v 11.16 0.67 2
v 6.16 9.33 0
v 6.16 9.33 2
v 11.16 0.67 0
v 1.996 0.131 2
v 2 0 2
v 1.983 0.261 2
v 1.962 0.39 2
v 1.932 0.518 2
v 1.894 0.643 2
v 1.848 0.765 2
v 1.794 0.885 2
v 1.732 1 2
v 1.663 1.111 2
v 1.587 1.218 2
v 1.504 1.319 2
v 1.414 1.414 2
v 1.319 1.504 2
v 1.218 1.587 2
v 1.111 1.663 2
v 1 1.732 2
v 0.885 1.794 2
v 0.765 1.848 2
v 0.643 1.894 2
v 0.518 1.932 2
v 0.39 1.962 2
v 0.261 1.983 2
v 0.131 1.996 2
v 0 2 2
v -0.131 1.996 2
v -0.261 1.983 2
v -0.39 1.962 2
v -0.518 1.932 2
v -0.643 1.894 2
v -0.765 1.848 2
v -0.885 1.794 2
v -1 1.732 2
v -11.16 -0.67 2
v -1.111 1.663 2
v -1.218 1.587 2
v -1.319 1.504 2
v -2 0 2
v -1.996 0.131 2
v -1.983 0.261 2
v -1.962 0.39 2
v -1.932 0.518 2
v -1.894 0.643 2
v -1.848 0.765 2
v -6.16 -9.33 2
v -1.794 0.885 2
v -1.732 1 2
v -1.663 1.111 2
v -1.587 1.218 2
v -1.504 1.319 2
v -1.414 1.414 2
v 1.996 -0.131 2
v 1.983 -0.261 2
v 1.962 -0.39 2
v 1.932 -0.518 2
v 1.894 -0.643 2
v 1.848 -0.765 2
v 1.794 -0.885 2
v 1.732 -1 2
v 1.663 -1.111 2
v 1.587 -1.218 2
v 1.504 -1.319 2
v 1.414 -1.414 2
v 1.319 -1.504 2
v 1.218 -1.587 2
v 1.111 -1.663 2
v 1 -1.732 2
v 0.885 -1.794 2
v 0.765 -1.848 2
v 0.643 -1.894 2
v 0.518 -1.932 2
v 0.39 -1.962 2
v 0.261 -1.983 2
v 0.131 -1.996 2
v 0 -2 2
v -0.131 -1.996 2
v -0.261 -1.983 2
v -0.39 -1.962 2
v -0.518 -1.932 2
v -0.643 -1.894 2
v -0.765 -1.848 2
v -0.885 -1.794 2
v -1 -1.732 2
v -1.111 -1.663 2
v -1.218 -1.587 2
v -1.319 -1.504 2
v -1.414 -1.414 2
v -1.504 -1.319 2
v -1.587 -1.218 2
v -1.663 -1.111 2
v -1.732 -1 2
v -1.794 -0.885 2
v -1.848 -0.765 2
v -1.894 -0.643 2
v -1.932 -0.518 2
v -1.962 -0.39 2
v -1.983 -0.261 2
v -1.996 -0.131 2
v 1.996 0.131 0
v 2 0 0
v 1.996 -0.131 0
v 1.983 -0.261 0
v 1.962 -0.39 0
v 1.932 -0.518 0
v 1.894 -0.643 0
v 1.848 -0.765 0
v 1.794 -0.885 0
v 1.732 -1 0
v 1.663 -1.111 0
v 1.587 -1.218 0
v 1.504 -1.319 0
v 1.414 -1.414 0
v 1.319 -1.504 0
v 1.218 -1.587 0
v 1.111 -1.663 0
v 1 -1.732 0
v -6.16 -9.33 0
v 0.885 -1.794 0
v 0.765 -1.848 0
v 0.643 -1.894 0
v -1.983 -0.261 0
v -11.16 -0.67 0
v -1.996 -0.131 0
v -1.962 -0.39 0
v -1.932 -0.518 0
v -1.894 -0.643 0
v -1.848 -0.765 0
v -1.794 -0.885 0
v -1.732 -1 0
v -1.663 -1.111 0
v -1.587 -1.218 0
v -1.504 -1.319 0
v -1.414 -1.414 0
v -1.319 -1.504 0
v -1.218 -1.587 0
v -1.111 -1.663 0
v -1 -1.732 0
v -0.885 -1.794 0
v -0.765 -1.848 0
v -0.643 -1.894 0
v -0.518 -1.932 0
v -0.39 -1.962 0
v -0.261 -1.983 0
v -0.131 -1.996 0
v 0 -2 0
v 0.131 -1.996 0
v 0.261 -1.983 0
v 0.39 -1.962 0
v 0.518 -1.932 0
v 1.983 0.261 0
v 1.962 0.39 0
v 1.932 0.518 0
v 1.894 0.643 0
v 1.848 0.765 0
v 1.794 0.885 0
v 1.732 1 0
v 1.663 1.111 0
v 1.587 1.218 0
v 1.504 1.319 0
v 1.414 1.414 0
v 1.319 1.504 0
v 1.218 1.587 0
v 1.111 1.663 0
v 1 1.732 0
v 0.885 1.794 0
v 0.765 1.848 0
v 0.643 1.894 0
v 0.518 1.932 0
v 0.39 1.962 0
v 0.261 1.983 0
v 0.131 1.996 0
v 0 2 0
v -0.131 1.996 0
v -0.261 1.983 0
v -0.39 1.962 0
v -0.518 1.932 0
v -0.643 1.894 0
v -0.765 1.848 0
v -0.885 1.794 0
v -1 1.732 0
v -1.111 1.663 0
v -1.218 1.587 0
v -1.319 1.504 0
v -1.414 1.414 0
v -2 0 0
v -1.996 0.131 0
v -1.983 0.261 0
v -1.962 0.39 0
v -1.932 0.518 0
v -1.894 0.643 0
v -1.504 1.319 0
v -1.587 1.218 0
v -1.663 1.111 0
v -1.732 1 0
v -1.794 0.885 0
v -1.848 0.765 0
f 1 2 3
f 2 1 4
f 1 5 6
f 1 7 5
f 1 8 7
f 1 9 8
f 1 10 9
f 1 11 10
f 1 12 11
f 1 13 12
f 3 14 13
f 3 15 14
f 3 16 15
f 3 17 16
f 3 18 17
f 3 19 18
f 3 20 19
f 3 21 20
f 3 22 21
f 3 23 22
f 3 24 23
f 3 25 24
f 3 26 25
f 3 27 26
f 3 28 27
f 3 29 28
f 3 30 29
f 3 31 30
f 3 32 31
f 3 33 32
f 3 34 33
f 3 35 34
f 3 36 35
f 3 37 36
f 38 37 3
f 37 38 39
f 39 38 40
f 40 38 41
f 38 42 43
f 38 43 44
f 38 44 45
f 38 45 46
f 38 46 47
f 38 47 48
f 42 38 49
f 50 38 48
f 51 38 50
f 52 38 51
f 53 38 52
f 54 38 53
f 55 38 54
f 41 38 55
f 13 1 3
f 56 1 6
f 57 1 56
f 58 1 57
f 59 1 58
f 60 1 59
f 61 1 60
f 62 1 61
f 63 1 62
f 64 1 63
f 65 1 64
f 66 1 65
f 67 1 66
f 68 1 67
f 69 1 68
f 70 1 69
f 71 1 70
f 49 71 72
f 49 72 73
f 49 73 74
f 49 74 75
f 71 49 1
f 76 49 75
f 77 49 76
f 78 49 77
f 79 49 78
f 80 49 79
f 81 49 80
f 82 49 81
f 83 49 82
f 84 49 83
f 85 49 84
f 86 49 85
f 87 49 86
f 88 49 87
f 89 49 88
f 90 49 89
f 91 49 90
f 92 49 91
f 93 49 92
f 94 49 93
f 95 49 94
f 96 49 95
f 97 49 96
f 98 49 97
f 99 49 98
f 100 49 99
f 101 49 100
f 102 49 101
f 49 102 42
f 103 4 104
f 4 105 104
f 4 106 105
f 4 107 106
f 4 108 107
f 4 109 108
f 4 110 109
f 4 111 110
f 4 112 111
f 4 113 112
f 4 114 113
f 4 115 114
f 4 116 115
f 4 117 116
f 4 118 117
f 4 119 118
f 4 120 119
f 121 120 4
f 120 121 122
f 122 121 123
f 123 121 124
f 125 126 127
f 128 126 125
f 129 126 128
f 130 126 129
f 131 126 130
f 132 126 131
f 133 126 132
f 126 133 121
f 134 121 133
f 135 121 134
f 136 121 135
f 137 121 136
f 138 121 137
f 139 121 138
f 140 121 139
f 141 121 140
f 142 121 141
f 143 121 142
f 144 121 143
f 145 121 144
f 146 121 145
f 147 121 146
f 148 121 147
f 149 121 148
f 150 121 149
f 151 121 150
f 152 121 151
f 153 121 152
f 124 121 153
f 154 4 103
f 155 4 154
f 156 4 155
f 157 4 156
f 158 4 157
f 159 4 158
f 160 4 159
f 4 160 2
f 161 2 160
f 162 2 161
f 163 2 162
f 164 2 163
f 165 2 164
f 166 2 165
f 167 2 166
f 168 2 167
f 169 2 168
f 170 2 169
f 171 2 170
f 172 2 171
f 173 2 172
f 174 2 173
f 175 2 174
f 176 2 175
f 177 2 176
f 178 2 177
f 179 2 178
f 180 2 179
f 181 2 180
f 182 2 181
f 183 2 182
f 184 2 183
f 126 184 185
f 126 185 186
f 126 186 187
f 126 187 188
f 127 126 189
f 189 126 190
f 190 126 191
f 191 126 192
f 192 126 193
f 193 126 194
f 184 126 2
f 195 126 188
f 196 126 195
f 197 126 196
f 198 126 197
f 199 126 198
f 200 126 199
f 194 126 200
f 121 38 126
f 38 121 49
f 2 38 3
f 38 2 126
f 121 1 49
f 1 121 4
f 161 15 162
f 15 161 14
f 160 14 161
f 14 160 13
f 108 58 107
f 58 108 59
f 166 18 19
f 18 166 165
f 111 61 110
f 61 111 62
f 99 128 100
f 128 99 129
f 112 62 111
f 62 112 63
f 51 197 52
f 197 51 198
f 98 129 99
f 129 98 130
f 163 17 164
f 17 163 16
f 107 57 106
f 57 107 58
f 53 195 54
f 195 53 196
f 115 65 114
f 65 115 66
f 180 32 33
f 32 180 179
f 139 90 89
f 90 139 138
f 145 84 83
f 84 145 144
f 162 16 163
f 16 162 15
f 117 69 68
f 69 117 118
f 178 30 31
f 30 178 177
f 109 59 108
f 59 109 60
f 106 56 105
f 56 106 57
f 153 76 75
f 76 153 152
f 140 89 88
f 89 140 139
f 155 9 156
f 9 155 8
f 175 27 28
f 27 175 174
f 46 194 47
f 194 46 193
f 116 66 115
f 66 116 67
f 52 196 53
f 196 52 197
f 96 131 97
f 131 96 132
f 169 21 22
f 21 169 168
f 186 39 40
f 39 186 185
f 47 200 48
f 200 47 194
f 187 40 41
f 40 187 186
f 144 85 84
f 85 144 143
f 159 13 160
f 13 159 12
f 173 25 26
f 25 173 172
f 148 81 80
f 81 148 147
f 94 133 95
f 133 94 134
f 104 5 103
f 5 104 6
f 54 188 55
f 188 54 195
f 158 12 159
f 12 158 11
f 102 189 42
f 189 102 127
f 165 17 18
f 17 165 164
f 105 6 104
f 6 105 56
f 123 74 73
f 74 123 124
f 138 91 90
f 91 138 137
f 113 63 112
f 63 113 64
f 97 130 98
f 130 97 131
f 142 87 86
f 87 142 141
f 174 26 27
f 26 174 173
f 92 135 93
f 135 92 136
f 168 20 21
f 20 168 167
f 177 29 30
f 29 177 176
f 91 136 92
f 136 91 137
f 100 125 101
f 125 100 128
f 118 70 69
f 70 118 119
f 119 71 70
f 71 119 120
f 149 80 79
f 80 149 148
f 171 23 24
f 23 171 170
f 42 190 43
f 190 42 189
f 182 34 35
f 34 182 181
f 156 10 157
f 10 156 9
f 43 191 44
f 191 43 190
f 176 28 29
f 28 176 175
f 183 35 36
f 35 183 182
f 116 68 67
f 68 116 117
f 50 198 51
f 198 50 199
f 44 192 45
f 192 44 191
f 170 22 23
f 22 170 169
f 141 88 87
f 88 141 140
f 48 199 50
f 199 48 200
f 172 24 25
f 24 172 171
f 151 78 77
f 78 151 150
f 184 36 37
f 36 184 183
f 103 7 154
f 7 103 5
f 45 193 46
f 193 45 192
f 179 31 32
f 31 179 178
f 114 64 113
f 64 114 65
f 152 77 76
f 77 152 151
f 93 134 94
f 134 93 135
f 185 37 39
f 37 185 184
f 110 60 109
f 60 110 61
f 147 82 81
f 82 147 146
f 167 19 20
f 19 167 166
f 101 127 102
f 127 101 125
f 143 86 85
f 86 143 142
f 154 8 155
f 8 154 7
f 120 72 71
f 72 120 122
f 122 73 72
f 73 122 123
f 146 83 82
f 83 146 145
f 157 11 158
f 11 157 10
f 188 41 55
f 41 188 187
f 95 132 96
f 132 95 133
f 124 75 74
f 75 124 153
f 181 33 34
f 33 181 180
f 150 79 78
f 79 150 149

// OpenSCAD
// Auto-generated from tests/data/feature_fixtures_manifest.json
// fixture: plate_rotated_z30_with_hole
// fixture_type: plate
// description: Plate rotated 30° around Z with a single through-hole. Validates rotated-plate local-frame cutout detection for Z-axis rotation.
// transform: rotate=[0.000000, 0.000000, 30.000000], translate=[0.000000, 0.000000, 0.000000]
$fn = 96;

plate_size = [20.000000, 10.000000, 2.000000];
plate_origin = [-10.000000, -5.000000, 0.000000];

module through_hole(center, diameter, height) {
  translate(center) cylinder(d=diameter, h=height, center=false);
}

module through_slot(start, end, width, height) {
  hull() {
    through_hole(start, width, height);
    through_hole(end, width, height);
  }
}

module counterbore_hole(center, through_d, bore_d, bore_depth, plate_thickness) {
  translate([center[0], center[1], -0.1])
    cylinder(d=through_d, h=plate_thickness + 0.2, center=false);
  translate([center[0], center[1], plate_thickness - bore_depth])
    cylinder(d=bore_d, h=bore_depth + 0.1, center=false);
}

translate([0.000000, 0.000000, 0.000000])
rotate([0.000000, 0.000000, 30.000000]) {
difference() {
  translate(plate_origin) cube(plate_size);
  through_hole([0.000000, 0.000000, -0.100000], 4.000000, 2.200000);  // hole_0
}
}
